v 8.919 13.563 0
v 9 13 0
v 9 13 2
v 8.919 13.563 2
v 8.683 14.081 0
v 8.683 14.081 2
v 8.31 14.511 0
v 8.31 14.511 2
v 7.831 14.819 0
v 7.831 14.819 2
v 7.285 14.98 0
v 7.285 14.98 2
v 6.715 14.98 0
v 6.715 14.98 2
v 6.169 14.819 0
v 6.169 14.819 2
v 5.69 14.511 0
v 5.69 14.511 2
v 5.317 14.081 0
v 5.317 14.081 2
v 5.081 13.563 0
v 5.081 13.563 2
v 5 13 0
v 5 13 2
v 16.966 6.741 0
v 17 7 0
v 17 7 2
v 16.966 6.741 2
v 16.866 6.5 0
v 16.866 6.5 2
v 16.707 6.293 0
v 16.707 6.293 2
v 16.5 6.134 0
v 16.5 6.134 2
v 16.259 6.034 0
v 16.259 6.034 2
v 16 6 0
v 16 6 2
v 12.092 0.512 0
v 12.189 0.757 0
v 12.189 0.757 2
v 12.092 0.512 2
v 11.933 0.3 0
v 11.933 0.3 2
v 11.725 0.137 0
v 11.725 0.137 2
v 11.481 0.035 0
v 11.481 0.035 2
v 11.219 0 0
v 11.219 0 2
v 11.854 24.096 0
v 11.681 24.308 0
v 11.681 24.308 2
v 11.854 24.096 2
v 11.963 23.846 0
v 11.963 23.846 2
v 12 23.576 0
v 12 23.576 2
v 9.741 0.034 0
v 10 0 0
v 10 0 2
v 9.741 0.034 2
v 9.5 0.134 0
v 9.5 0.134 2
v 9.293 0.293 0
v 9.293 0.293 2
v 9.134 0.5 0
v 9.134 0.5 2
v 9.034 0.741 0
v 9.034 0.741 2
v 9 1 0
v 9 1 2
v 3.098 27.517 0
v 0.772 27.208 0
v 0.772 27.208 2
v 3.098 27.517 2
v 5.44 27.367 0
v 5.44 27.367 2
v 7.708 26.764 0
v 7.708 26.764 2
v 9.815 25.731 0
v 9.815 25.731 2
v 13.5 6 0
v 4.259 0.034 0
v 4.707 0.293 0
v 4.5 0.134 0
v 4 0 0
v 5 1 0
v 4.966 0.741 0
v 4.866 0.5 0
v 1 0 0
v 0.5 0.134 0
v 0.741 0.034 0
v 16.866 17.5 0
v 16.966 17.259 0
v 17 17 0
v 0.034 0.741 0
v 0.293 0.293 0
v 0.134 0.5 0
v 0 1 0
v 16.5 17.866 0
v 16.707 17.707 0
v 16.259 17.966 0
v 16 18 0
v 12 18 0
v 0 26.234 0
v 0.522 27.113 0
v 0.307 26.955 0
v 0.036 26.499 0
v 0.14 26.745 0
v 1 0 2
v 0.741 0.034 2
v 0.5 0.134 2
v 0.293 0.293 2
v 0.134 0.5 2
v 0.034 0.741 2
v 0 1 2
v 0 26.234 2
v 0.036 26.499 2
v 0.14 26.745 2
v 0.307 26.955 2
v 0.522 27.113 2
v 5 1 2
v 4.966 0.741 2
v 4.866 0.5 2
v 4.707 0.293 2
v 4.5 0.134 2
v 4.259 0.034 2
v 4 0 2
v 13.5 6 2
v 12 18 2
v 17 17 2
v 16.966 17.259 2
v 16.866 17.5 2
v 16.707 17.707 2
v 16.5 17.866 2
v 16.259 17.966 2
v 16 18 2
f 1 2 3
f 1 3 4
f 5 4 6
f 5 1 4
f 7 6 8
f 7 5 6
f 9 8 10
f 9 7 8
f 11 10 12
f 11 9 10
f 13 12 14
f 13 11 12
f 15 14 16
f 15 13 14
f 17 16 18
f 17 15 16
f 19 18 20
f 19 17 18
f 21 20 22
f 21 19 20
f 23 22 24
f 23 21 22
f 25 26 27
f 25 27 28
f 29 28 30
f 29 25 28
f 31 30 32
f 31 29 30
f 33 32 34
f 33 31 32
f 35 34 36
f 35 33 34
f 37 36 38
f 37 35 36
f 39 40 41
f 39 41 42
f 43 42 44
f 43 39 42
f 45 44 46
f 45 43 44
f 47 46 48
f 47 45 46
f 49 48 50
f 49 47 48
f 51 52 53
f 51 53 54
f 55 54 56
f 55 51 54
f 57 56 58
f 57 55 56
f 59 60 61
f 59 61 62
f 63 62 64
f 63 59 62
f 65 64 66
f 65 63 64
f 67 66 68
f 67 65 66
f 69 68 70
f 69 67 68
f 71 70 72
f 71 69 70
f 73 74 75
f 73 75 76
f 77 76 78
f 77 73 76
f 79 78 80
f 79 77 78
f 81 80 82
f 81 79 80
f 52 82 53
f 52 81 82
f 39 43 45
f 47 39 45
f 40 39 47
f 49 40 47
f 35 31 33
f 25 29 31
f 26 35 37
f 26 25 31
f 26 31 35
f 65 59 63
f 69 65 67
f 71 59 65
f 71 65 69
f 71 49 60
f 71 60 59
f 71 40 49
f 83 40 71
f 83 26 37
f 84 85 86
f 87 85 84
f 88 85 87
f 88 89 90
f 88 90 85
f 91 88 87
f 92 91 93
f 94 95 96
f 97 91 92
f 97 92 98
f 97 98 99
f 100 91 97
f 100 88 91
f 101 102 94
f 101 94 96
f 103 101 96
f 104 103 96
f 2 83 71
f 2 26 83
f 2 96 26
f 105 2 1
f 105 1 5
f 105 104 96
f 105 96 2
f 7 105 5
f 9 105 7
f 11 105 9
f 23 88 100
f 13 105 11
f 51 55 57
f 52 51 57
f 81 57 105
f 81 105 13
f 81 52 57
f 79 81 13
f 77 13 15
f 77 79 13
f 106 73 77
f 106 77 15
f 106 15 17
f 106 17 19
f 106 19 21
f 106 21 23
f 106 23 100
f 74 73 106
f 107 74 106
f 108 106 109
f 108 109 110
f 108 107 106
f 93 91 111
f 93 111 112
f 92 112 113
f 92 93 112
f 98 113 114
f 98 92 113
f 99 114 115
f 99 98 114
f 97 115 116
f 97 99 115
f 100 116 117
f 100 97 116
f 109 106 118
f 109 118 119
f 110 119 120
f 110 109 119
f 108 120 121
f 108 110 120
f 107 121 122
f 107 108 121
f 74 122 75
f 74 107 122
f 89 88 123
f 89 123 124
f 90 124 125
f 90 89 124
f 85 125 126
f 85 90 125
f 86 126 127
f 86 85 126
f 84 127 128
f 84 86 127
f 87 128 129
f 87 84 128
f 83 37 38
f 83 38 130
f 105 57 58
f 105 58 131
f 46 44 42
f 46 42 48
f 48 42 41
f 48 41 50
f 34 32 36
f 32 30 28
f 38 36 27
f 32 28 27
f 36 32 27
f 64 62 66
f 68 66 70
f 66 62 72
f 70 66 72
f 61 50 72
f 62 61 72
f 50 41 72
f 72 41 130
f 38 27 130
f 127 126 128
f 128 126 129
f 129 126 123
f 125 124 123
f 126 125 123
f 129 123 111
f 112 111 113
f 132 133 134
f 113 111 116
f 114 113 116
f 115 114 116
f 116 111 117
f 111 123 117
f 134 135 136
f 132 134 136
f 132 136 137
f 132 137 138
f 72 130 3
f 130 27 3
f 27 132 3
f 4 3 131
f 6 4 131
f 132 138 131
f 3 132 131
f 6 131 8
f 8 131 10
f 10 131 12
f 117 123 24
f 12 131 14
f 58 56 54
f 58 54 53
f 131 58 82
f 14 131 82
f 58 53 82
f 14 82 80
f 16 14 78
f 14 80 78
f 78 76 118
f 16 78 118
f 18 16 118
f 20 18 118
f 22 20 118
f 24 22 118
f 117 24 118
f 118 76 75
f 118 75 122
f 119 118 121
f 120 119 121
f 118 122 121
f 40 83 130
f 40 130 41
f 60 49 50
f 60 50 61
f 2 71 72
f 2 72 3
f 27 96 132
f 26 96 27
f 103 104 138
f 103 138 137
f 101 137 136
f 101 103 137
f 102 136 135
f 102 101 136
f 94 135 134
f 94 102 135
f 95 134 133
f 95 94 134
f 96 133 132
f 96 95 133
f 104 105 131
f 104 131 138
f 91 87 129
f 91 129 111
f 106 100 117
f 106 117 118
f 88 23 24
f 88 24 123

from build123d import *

# Parameters (mm, degrees)
RESSALTO_EXTRUS_O1_DEPTH = 2


with BuildPart() as part:
    # Esboço1 → Ressalto-extrusão1 (new body)
    with BuildSketch(Plane.XY):
        with BuildLine():
            Line((0, 1), (0, 26.234323652))
            ThreePointArc((0, 26.234323652), (0.216479701, 26.855689841), (0.772191883, 27.208029697))
            ThreePointArc((0.772191883, 27.208029697), (6.58904443, 27.120718638), (11.681282792, 24.30780107))
            ThreePointArc((11.681282792, 24.30780107), (11.916864982, 23.974978194), (12, 23.575780744))
            Line((12, 23.575780744), (12, 18))
            Line((12, 18), (16, 18))
            ThreePointArc((16, 18), (16.707106781, 17.707106781), (17, 17))
            Line((17, 17), (17, 7))
            ThreePointArc((17, 7), (16.707106781, 6.292893219), (16, 6))
            Line((16, 6), (13.5, 6))
            Line((13.5, 6), (12.189366094, 0.757464375))
            ThreePointArc((12.189366094, 0.757464375), (11.834635803, 0.211794562), (11.219223594, 0))
            Line((11.219223594, 0), (10, 0))
            ThreePointArc((10, 0), (9.292893219, 0.292893219), (9, 1))
            Line((9, 1), (9, 13))
            ThreePointArc((9, 13), (7, 15), (5, 13))
            Line((5, 13), (5, 1))
            ThreePointArc((5, 1), (4.707106781, 0.292893219), (4, 0))
            Line((4, 0), (1, 0))
            ThreePointArc((1, 0), (0.292893219, 0.292893219), (0, 1))
        make_face()
    extrude(amount=RESSALTO_EXTRUS_O1_DEPTH)


solid = part.part
